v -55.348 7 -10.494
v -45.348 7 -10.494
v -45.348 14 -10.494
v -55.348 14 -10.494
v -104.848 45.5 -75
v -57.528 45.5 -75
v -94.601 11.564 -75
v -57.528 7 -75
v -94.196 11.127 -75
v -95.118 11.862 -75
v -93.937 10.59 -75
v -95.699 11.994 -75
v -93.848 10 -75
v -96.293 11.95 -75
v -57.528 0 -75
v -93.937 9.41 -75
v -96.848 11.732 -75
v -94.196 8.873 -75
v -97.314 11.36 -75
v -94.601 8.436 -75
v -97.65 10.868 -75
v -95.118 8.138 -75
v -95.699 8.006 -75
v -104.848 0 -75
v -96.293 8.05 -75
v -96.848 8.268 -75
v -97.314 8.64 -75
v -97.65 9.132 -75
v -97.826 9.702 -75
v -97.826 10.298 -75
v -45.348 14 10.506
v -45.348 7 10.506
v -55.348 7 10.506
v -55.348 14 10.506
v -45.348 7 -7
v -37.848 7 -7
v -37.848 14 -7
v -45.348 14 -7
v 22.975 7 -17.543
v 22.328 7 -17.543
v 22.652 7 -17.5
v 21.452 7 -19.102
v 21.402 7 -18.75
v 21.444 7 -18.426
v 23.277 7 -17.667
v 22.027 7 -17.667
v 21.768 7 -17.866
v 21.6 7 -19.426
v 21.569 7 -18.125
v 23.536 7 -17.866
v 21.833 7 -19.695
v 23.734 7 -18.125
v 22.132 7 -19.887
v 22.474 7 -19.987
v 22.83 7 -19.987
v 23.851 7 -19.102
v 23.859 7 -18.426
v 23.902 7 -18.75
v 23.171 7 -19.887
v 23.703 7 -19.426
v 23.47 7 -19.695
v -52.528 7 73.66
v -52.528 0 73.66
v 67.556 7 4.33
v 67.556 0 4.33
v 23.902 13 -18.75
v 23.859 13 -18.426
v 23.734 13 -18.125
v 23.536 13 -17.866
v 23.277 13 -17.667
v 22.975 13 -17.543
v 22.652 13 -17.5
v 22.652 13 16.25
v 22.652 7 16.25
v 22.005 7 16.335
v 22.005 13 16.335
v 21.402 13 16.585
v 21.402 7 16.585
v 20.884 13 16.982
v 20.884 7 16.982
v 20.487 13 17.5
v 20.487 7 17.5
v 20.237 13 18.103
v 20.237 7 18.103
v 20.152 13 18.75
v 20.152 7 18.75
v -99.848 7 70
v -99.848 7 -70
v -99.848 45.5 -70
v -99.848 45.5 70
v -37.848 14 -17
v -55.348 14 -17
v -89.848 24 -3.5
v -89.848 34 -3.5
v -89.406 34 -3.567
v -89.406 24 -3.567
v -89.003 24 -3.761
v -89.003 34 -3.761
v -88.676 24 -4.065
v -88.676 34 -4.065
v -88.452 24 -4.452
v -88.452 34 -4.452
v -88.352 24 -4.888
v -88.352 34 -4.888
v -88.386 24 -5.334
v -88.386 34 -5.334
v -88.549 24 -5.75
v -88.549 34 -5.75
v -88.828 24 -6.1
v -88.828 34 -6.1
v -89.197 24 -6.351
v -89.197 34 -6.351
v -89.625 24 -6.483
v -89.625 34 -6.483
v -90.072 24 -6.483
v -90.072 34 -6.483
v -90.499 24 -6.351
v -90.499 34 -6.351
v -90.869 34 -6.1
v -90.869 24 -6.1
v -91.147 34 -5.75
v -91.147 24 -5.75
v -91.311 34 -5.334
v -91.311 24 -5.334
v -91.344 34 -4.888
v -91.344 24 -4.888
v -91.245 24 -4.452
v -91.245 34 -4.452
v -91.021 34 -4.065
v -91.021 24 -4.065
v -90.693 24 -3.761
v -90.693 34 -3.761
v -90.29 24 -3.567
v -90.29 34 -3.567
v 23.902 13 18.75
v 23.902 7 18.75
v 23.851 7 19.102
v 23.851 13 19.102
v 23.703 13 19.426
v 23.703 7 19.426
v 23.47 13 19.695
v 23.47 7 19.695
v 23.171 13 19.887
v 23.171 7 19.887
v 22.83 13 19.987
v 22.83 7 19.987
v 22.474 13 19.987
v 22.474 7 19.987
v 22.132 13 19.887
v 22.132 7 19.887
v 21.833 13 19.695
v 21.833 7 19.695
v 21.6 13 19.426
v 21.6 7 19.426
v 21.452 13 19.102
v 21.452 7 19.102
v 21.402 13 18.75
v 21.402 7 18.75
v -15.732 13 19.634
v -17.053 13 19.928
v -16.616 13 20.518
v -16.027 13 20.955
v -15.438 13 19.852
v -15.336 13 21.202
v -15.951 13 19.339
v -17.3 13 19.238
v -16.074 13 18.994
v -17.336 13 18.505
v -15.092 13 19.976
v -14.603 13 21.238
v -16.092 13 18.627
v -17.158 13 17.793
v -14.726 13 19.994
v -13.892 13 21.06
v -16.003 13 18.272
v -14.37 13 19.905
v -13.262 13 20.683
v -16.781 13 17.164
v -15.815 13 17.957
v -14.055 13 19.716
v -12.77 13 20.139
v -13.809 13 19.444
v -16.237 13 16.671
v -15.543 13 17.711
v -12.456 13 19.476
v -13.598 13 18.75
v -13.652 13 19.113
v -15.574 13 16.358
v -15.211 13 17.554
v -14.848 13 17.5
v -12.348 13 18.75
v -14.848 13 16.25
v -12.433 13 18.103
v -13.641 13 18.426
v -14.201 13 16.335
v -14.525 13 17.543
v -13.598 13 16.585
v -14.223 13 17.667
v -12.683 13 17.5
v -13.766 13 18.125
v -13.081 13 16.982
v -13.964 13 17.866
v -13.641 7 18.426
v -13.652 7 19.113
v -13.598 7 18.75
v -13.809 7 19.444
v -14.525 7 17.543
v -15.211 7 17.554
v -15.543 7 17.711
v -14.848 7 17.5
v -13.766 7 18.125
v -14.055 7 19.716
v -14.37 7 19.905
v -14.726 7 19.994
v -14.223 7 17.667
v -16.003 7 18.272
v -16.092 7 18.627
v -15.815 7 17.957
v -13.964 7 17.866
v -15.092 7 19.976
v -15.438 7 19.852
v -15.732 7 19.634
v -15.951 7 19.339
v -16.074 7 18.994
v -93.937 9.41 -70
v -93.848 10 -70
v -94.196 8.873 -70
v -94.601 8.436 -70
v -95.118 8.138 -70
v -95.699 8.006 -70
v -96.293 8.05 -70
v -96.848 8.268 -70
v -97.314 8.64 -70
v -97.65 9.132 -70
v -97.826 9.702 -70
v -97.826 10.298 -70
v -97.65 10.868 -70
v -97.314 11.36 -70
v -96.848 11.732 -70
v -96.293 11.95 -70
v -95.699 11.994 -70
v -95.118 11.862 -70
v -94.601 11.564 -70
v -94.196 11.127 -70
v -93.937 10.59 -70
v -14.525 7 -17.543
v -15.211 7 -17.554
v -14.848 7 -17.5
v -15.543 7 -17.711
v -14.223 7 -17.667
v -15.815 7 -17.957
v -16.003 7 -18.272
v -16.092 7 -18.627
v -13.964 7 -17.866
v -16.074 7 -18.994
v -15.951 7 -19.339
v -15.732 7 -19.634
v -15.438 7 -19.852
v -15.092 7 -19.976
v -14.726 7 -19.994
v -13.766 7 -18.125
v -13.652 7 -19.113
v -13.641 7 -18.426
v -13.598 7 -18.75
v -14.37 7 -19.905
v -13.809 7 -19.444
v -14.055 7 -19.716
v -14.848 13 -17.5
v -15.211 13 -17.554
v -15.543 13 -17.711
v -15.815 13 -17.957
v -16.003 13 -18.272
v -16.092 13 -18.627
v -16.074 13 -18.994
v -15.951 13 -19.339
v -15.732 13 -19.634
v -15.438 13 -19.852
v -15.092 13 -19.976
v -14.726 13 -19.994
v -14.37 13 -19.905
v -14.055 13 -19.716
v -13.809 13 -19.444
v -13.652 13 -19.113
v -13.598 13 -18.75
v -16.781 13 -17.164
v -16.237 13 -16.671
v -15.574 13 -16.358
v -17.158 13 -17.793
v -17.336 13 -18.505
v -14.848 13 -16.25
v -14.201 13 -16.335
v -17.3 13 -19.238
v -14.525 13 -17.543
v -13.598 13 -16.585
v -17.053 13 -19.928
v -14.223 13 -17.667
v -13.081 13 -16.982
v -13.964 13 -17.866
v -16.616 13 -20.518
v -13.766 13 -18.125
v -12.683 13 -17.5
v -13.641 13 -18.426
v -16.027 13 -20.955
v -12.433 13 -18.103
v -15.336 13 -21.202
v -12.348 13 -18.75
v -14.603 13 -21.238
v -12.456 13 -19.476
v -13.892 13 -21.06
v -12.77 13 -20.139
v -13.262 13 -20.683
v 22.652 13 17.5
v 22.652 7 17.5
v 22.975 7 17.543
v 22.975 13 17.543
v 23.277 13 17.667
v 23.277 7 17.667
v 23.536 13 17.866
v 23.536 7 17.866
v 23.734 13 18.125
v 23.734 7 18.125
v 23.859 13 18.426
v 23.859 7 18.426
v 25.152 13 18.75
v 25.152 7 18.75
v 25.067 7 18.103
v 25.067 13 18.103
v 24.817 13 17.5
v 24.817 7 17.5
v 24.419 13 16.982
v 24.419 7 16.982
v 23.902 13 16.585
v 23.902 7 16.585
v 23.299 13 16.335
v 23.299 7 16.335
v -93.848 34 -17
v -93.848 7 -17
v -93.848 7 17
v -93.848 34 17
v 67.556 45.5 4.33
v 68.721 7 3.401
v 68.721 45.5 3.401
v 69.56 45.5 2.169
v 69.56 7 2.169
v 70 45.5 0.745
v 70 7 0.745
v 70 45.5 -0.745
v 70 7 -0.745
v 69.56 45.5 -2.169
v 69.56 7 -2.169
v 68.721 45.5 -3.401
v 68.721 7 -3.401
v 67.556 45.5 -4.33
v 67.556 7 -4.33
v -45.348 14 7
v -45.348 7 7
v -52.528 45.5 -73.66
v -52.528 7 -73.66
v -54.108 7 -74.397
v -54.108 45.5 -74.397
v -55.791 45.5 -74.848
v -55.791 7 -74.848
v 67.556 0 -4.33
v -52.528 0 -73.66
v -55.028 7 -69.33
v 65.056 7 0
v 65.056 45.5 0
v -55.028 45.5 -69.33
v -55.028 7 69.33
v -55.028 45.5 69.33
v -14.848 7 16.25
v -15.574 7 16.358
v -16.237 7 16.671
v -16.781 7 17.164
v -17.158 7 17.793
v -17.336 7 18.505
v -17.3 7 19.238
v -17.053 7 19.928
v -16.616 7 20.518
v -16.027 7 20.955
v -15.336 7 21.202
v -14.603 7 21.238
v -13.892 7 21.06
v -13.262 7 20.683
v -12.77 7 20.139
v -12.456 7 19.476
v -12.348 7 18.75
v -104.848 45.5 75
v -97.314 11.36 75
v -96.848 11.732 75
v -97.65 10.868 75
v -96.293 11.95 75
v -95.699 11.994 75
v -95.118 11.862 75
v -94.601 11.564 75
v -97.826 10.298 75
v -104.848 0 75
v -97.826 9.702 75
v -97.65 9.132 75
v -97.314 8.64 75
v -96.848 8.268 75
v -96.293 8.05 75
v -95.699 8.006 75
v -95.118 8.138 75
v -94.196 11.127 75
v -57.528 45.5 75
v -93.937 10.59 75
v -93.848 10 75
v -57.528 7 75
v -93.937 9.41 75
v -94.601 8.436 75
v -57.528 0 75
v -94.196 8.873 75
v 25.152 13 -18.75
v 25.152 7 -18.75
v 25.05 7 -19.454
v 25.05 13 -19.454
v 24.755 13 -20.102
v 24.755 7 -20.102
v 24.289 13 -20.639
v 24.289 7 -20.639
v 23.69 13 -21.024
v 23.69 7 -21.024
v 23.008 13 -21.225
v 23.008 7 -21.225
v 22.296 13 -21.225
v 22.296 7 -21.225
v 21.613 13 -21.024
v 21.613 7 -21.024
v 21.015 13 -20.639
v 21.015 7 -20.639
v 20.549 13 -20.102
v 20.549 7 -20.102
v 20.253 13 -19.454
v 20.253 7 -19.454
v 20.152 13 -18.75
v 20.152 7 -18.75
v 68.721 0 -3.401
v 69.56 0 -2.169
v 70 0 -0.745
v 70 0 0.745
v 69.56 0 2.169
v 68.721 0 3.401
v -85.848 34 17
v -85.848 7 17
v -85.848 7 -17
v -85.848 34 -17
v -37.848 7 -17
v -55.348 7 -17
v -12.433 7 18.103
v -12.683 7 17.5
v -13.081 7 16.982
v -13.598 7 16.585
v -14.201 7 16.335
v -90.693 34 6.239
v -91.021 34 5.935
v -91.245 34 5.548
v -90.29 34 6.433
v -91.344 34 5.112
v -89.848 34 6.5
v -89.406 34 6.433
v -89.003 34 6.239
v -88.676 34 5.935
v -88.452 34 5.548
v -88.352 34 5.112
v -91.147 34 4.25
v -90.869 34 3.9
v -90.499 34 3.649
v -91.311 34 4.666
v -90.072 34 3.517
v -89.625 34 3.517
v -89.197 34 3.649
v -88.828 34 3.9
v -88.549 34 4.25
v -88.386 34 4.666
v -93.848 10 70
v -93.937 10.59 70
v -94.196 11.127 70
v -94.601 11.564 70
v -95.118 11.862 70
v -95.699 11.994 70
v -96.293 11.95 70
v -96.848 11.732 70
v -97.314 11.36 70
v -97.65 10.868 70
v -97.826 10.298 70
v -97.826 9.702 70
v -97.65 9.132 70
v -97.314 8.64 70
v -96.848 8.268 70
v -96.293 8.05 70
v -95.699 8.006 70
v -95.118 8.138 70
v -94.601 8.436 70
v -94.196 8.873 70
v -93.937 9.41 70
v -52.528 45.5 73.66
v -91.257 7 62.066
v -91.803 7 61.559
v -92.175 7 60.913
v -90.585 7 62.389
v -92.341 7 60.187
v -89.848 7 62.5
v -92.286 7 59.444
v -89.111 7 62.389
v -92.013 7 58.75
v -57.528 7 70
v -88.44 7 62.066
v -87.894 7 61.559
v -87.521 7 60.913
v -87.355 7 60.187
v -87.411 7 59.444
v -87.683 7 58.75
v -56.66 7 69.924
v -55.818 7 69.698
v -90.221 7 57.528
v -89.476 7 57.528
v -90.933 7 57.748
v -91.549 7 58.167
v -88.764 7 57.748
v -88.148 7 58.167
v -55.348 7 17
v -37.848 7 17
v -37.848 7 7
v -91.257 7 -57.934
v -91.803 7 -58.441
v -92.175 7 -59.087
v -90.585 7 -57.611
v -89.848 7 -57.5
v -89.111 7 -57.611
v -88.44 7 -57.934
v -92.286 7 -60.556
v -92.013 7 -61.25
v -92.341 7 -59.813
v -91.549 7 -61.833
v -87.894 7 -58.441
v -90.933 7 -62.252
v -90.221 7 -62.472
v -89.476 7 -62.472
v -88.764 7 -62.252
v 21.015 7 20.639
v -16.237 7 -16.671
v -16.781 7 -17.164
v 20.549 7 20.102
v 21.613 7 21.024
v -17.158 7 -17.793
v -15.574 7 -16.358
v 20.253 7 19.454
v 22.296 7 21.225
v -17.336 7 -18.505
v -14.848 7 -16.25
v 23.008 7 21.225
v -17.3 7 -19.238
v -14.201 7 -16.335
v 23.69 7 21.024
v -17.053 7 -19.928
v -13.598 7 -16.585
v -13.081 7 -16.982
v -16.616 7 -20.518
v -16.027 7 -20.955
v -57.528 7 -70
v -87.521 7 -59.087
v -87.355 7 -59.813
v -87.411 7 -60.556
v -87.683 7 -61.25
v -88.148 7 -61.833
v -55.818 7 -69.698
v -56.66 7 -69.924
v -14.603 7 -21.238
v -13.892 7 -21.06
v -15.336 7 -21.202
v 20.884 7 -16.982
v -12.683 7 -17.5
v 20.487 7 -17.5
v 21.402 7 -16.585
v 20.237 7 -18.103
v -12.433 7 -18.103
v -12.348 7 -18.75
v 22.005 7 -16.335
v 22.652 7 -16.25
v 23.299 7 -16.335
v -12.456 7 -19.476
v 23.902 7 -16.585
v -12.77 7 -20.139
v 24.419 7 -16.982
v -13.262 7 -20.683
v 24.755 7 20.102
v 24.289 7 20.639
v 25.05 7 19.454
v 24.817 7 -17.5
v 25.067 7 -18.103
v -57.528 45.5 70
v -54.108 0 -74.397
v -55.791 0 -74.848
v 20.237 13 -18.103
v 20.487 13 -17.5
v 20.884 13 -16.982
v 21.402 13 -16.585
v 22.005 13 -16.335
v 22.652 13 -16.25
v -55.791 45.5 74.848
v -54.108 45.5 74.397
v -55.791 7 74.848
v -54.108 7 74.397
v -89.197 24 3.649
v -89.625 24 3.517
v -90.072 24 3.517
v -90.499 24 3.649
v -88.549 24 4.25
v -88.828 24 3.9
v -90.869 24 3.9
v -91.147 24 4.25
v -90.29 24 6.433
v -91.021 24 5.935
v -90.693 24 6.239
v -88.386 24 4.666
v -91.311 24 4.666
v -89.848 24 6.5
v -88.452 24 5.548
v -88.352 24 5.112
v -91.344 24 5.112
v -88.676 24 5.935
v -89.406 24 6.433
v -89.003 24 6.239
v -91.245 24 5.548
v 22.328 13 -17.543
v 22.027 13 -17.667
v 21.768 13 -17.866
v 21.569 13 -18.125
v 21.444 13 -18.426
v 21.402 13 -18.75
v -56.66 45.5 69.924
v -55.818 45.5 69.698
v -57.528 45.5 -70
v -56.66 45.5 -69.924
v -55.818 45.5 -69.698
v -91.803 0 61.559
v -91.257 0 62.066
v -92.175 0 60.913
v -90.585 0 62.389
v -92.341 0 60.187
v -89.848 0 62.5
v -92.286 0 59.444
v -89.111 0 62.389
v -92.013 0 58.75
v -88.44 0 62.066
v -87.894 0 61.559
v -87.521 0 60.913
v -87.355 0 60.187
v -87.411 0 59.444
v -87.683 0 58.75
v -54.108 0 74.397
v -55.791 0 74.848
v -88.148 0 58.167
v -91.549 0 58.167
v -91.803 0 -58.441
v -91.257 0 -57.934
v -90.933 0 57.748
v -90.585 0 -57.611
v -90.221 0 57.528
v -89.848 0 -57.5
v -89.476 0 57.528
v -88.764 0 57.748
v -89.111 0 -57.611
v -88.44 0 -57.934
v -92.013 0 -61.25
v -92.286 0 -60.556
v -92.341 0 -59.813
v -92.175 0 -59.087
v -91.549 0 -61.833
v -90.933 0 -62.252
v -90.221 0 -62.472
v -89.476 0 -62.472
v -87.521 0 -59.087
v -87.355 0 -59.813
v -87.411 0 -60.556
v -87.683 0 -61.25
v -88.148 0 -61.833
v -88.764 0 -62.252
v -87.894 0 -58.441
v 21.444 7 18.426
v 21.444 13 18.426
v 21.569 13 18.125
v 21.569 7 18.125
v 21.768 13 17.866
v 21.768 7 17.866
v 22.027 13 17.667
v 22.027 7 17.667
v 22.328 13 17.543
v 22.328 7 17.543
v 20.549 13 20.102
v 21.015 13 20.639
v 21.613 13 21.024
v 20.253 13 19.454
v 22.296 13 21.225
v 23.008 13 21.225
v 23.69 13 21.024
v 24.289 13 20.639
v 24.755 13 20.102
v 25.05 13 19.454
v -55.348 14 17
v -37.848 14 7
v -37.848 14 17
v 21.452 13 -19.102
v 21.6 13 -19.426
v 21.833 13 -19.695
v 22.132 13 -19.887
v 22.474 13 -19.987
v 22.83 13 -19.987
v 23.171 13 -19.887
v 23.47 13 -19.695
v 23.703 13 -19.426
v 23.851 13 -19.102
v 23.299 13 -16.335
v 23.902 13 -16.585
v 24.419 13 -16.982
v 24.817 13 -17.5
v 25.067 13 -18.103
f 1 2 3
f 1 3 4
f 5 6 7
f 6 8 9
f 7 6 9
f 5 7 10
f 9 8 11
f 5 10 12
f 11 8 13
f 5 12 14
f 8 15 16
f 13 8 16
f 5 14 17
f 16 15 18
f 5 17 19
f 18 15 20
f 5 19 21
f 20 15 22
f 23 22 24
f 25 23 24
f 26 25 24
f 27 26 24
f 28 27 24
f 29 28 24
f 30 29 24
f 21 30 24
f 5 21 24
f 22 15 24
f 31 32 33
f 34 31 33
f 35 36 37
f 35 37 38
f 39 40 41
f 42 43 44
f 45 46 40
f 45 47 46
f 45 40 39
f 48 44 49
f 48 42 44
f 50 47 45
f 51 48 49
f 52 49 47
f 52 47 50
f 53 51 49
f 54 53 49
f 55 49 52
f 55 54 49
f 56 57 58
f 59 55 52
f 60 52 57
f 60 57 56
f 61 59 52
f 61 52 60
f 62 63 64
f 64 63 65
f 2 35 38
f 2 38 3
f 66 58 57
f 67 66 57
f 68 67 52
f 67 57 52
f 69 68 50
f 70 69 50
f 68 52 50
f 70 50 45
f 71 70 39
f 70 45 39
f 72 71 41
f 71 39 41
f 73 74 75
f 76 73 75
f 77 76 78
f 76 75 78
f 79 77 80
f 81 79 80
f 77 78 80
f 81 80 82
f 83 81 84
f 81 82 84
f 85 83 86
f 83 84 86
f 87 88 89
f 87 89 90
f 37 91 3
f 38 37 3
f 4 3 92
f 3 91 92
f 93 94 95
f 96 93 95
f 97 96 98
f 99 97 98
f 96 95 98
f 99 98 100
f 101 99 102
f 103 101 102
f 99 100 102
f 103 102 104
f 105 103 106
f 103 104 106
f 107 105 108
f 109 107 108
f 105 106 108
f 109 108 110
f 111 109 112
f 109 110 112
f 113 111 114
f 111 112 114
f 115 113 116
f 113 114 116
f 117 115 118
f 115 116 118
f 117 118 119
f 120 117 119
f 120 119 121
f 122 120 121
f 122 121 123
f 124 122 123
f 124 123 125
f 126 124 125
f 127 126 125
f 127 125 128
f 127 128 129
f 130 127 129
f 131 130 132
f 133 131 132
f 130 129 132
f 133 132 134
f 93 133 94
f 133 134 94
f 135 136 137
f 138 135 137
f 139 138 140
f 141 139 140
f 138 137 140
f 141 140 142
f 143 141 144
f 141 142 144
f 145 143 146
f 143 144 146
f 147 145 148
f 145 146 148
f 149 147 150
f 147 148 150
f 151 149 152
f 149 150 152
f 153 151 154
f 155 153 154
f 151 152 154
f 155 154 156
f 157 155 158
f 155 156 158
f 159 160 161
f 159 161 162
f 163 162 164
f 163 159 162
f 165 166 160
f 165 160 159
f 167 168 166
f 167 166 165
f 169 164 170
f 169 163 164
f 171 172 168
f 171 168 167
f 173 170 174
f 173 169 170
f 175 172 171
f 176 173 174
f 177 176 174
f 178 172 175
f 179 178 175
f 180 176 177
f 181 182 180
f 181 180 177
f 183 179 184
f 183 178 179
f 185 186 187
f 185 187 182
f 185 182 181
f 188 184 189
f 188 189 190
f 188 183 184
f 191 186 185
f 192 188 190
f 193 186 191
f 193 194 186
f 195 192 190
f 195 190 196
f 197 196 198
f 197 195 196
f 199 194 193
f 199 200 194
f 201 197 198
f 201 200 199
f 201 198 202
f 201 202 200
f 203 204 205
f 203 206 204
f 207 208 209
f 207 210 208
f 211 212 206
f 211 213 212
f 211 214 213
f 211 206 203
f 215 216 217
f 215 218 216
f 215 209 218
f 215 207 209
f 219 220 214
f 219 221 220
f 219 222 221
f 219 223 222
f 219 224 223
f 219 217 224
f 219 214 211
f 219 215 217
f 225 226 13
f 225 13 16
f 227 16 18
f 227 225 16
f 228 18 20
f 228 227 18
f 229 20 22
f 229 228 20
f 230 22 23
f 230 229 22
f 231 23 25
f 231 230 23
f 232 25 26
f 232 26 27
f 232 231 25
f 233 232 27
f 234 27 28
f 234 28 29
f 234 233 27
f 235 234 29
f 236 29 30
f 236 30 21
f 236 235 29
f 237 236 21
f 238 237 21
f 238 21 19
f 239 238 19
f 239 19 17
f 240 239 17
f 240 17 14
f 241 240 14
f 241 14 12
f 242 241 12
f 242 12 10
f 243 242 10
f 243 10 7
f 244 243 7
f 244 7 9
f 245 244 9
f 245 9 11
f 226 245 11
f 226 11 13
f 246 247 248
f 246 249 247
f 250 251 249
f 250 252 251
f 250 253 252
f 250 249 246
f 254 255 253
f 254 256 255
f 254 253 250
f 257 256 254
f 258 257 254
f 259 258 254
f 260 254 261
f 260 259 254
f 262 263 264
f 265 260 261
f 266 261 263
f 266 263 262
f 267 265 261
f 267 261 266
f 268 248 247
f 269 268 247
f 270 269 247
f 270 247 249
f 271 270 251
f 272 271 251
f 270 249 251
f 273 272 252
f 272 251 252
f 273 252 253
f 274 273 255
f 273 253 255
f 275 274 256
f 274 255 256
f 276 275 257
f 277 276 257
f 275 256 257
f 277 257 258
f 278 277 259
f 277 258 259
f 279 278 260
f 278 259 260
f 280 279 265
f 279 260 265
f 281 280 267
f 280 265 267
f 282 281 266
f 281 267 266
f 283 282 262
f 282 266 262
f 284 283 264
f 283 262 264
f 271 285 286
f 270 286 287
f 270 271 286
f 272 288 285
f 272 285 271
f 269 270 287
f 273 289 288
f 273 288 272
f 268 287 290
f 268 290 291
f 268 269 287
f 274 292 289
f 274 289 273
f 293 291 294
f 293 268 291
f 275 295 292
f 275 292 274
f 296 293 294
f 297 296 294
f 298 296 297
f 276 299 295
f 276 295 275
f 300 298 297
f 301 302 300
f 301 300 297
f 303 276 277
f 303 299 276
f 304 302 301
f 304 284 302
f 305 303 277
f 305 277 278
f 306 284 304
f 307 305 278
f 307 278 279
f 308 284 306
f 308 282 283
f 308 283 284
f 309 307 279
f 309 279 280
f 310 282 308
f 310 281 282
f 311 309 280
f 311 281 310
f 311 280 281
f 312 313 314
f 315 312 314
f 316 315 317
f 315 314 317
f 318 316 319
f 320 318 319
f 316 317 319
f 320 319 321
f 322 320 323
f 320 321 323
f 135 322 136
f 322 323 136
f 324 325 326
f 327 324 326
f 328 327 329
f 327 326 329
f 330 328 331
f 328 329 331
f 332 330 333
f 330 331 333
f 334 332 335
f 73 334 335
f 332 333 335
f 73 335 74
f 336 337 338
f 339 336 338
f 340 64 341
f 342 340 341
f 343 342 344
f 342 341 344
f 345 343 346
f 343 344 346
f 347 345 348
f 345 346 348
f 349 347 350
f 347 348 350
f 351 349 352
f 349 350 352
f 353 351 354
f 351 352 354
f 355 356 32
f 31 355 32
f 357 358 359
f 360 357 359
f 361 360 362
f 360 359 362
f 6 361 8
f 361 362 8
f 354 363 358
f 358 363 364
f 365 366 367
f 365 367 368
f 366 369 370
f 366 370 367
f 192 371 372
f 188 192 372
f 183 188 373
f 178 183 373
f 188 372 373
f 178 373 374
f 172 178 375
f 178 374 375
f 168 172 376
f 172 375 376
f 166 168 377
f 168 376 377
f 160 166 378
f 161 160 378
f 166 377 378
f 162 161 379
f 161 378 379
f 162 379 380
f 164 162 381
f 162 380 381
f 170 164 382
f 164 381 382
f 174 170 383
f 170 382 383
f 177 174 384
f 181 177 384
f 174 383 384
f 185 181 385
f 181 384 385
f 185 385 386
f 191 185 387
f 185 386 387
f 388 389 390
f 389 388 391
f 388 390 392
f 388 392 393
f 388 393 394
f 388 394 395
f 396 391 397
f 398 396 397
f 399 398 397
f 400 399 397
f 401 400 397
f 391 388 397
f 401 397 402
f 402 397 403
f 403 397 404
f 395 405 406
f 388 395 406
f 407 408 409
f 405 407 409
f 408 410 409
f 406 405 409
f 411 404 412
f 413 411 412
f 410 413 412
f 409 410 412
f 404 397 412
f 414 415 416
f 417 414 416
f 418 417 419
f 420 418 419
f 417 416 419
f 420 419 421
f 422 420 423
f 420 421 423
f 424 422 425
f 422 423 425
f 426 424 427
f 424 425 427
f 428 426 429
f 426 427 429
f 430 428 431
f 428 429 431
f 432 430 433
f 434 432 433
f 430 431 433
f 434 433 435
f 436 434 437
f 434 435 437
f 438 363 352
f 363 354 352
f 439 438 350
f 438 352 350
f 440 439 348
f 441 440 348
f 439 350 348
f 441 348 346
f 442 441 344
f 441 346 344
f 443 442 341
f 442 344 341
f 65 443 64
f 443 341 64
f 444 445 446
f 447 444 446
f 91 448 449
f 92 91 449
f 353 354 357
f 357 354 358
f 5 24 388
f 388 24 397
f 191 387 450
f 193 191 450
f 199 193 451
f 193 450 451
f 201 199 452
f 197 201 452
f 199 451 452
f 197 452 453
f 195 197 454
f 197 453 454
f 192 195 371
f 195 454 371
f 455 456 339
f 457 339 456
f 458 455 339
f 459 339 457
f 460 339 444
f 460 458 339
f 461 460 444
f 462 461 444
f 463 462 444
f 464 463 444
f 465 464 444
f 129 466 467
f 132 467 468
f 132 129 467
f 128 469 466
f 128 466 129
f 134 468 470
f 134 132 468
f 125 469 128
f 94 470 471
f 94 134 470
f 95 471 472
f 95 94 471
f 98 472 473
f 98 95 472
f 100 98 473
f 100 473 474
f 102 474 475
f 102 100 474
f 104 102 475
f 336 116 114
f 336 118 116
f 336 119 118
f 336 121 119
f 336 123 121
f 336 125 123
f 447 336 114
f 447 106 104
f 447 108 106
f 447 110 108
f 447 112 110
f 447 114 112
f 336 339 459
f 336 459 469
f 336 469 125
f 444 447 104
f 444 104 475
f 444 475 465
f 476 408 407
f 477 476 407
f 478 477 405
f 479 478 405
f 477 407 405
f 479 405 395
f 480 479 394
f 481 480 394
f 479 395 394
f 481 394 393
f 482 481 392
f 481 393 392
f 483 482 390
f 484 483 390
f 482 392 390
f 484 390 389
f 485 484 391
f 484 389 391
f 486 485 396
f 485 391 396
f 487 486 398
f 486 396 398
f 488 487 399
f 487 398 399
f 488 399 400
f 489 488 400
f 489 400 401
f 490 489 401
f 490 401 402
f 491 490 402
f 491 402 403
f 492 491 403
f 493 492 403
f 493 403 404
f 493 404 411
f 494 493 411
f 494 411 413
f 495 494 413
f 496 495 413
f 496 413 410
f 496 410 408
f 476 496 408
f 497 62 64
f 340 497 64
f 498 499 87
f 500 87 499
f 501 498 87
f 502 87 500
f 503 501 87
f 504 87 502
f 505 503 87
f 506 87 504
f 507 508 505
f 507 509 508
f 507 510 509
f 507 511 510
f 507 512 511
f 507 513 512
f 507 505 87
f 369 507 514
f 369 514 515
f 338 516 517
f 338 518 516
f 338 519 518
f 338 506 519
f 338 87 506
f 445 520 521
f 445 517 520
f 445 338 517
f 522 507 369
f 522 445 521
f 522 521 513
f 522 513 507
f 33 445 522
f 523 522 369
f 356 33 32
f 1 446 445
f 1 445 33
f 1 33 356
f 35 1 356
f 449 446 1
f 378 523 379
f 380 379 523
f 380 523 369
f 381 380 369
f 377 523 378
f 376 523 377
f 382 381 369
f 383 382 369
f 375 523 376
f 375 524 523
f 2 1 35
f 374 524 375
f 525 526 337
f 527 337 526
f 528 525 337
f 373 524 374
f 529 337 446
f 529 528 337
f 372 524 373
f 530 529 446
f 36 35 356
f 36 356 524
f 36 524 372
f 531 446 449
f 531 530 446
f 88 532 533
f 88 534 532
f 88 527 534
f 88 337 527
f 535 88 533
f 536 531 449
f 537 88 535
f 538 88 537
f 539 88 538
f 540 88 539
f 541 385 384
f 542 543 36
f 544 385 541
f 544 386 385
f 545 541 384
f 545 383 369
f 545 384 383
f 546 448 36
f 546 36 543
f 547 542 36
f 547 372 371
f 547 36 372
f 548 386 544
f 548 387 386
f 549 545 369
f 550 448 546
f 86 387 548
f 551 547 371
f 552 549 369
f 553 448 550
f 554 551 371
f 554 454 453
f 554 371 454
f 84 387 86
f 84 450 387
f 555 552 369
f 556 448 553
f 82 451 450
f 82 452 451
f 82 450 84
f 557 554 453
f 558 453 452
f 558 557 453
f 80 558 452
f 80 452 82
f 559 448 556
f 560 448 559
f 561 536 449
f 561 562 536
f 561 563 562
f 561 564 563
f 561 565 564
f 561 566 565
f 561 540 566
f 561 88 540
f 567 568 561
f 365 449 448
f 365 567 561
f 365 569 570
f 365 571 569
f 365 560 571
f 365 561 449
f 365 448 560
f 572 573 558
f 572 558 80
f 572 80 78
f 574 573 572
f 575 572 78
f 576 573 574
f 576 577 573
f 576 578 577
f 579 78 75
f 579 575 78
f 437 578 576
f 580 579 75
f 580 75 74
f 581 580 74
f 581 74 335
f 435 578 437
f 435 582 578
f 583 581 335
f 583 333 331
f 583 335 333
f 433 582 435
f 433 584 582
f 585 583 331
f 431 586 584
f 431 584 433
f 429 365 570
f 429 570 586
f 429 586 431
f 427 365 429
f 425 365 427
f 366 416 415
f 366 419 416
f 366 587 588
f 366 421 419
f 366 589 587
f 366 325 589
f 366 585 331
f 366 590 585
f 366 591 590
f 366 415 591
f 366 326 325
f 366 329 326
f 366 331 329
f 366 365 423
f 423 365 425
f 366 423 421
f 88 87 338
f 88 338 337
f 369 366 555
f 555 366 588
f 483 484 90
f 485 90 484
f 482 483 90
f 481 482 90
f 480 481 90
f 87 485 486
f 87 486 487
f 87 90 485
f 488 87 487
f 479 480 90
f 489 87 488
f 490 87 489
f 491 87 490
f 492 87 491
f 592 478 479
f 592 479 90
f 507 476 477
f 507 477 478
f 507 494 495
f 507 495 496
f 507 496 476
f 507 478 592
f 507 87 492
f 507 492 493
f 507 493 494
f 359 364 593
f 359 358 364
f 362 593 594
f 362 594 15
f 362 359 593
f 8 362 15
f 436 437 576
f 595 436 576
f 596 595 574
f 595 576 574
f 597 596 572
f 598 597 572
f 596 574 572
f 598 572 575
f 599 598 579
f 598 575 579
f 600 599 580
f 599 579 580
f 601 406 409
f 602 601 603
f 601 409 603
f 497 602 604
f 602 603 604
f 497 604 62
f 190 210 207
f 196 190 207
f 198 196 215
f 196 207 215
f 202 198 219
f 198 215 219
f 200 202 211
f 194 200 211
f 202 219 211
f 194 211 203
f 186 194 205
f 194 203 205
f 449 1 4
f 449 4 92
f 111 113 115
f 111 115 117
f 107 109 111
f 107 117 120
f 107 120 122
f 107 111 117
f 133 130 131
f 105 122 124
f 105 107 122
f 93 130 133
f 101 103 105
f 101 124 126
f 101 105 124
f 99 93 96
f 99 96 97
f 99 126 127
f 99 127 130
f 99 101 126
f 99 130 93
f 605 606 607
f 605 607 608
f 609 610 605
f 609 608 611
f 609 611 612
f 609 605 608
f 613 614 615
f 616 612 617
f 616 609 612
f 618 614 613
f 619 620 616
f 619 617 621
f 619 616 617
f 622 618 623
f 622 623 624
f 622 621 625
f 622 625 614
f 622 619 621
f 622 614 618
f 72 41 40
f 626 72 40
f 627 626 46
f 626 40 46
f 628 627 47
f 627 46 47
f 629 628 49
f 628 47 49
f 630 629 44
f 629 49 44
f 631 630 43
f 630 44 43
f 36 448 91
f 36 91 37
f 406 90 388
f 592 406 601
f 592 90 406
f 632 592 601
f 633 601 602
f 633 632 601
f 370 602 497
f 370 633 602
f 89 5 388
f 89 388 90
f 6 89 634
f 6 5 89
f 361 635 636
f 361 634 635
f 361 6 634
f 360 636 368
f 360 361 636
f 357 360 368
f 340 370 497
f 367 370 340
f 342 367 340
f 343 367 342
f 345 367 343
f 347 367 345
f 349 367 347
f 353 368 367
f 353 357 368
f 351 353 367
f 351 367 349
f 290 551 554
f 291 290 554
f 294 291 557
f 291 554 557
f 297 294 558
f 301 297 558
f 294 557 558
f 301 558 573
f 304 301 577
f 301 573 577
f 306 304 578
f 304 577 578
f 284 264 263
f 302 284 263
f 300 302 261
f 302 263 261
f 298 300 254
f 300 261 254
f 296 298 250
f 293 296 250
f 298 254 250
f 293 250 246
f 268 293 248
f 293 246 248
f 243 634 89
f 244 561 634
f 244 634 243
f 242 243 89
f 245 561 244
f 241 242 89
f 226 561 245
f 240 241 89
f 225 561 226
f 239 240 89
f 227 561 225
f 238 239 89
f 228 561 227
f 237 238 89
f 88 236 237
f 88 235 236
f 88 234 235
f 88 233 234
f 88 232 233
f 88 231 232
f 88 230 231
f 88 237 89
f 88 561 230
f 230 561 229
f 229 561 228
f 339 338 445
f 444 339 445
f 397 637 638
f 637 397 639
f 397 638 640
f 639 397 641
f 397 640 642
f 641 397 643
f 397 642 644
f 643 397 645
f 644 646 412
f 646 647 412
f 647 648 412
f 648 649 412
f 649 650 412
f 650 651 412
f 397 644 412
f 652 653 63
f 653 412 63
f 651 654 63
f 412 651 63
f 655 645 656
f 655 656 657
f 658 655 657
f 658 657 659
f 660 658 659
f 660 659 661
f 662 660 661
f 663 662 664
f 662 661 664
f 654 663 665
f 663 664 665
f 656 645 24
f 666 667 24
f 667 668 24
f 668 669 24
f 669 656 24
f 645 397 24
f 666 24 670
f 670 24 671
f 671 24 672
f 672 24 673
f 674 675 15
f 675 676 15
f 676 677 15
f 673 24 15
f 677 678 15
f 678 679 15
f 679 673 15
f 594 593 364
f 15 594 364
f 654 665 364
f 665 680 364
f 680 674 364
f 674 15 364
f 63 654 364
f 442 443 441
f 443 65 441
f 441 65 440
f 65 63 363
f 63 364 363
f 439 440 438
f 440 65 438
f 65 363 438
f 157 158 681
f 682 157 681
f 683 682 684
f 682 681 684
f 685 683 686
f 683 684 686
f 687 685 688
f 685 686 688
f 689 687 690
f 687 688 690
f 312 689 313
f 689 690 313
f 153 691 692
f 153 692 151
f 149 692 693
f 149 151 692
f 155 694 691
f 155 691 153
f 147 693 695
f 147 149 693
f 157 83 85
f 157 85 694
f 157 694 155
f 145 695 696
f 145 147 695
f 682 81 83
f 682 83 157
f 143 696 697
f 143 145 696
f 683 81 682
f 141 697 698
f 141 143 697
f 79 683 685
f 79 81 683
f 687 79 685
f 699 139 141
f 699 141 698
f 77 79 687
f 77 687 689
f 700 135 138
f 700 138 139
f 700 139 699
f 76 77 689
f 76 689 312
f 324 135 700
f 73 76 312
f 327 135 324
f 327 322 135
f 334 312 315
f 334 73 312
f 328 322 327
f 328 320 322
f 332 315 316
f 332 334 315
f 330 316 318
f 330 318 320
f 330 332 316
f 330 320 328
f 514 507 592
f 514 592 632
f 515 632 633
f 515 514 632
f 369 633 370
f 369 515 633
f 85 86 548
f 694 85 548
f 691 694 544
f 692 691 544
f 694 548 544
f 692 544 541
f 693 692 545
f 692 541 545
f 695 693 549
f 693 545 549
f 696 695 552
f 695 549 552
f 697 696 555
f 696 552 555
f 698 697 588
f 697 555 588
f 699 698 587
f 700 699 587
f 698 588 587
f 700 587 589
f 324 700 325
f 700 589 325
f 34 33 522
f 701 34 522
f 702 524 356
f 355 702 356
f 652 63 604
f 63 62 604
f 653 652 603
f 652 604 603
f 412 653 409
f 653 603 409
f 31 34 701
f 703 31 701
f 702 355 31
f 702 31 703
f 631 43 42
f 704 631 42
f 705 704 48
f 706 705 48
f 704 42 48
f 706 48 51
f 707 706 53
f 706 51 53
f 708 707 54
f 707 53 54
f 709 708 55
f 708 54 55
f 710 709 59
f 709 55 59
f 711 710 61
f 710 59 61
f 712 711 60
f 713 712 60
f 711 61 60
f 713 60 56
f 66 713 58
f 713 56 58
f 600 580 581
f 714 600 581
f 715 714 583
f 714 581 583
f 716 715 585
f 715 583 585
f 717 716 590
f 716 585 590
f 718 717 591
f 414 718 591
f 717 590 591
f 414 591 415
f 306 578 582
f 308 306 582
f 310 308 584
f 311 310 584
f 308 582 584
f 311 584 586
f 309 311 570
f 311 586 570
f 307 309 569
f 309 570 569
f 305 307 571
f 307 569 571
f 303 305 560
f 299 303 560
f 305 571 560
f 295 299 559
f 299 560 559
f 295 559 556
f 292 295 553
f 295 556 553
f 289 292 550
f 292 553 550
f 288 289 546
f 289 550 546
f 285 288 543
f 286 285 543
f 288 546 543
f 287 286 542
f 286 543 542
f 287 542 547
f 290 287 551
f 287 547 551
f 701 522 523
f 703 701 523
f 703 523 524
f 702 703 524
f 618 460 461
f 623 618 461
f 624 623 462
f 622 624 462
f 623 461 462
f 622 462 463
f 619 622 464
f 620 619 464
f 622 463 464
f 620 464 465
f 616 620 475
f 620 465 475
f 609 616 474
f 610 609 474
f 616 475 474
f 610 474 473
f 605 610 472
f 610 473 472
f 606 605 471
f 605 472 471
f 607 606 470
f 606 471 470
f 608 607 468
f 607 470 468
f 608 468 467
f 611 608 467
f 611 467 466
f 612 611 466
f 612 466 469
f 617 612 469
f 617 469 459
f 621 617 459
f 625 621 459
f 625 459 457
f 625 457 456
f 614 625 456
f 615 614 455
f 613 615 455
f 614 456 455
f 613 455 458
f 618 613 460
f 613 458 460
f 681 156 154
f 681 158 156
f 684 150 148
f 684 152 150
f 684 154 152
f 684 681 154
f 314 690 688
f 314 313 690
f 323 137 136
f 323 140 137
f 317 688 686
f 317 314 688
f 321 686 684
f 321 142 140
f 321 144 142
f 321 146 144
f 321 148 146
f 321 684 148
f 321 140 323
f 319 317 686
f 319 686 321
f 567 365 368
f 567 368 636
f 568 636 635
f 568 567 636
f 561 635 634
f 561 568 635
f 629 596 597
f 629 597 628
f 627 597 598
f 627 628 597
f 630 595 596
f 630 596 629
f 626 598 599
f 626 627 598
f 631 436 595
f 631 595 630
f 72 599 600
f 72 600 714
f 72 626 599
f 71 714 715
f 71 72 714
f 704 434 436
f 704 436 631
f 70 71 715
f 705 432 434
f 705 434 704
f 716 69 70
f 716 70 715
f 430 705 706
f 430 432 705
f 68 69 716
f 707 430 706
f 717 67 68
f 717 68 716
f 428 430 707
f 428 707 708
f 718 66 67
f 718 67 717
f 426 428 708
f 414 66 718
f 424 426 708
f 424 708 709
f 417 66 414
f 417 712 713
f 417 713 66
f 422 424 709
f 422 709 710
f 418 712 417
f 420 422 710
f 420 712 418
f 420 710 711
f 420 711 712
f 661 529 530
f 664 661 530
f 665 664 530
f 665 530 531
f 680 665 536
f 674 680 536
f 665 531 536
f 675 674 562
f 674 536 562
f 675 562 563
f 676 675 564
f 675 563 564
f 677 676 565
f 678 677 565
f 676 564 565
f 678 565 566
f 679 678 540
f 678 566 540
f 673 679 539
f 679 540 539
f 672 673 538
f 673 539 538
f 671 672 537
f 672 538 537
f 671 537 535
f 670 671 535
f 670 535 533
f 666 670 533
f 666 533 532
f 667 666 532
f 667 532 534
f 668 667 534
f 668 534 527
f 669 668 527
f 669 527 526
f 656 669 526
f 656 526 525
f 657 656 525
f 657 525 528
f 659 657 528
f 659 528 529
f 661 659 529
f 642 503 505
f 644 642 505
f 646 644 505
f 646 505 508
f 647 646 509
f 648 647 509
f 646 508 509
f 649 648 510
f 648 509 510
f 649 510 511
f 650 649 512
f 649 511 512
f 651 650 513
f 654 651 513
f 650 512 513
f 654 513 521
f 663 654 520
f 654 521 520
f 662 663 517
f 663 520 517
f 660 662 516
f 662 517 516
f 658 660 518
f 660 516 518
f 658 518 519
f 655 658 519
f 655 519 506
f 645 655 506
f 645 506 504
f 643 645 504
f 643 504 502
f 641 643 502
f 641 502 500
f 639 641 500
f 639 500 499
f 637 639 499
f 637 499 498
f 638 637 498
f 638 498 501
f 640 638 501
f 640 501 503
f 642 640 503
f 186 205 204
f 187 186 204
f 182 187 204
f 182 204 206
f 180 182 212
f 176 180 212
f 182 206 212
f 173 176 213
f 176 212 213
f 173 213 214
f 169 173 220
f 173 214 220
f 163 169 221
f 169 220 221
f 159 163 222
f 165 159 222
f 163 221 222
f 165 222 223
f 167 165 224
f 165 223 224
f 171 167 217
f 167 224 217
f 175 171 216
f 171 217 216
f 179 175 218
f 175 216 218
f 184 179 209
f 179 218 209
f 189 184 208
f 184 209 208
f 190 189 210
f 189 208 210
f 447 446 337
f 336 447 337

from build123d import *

# Parameters (mm, degrees)
BOSS_EXTRUDE1_DEPTH = 7
FILLET1_R           = 5
FILLET2_R           = 10
CUT_EXTRUDE1_REACH  = 131.101
SKETCH3_R           = 2.5
BOSS_EXTRUDE2_DEPTH = 6
SKETCH7_W           = 4
SKETCH7_H           = 10
BOSS_EXTRUDE3_DEPTH = 27
SKETCH8_R           = 1.5
CUT_EXTRUDE2_DEPTH  = 10
BOSS_EXTRUDE4_DEPTH = 7
BOSS_EXTRUDE5_DEPTH = 7
BOSS_EXTRUDE6_DEPTH = 38.5
SKETCH14_R          = 2
CUT_EXTRUDE3_DEPTH  = 10
CUT_EXTRUDE4_START  = -10
SKETCH15_R          = 2
CUT_EXTRUDE4_DEPTH  = 10


with BuildPart() as part:
    # Sketch1 → Boss-Extrude1 (new body)
    with BuildSketch(Plane(origin=(0, 0, 0), x_dir=(1, 0, 0), z_dir=(0, 1, 0))):
        Polygon((75.055534995, 0), (-54.848275573, 75), (-104.848275573, 75), (-104.848275573, -75), (-54.848275573, -75), align=None)
    extrude(amount=BOSS_EXTRUDE1_DEPTH)

    # Fillet1
    fillet1_edges = [part.edges().sort_by_distance(p)[0] for p in [
        (75.055534995, 3.5, 0),
    ]]
    fillet(fillet1_edges, radius=FILLET1_R)

    # Fillet2
    fillet2_edges = [part.edges().sort_by_distance(p)[0] for p in [
        (-54.848275573, 3.5, 75),
        (-54.848275573, 3.5, -75),
    ]]
    fillet(fillet2_edges, radius=FILLET2_R)

    # Sketch3 → Cut-Extrude1 (cut, up to next)
    with BuildSketch(Plane(origin=(0, 7, 0), x_dir=(1, 0, 0), z_dir=(0, 1, 0)), mode=Mode.PRIVATE) as cut_extrude1_sk1:
        with Locations(Location((-89.848275573, 60, 0), (0, 0, 270))):
            Circle(SKETCH3_R)
    cut_extrude1_tool1 = extrude(cut_extrude1_sk1.sketch, amount=-CUT_EXTRUDE1_REACH, mode=Mode.PRIVATE) & part.part
    # Sketch3 → Cut-Extrude1 (cut, up to next)
    with BuildSketch(Plane(origin=(0, 7, 0), x_dir=(1, 0, 0), z_dir=(0, 1, 0)), mode=Mode.PRIVATE) as cut_extrude1_sk2:
        with Locations(Location((-89.848275573, -60, 0), (0, 0, 270))):
            Circle(SKETCH3_R)
    cut_extrude1_tool2 = extrude(cut_extrude1_sk2.sketch, amount=-CUT_EXTRUDE1_REACH, mode=Mode.PRIVATE) & part.part
    add(cut_extrude1_tool1.solids().sort_by_distance((-89.848276, 7, -60))[0], mode=Mode.SUBTRACT)
    add(cut_extrude1_tool2.solids().sort_by_distance((-89.848276, 7, 60))[0], mode=Mode.SUBTRACT)

    # Sketch6 → Boss-Extrude2 (add)
    with BuildSketch(Plane(origin=(0, 7, 0), x_dir=(1, 0, 0), z_dir=(0, 1, 0))):
        with BuildLine():
            ThreePointArc((-14.848275573, 17.5), (-15.732159049, 19.633883476), (-13.598275573, 18.75))
            Line((-13.598275573, 18.75), (-12.348275573, 18.75))
            ThreePointArc((-12.348275573, 18.75), (-16.616042526, 20.517766953), (-14.848275573, 16.25))
            Line((-14.848275573, 16.25), (-14.848275573, 17.5))
        make_face()
        with BuildLine():
            Line((-12.348275573, 18.75), (-13.598275573, 18.75))
            ThreePointArc((-13.598275573, 18.75), (-13.964392097, 17.866116524), (-14.848275573, 17.5))
            Line((-14.848275573, 17.5), (-14.848275573, 16.25))
            ThreePointArc((-14.848275573, 16.25), (-13.08050862, 16.982233047), (-12.348275573, 18.75))
        make_face()
        with BuildLine():
            ThreePointArc((23.901724427, 18.75), (23.535607903, 17.866116524), (22.651724427, 17.5))
            Line((22.651724427, 17.5), (22.651724427, 16.25))
            ThreePointArc((22.651724427, 16.25), (24.41949138, 16.982233047), (25.151724427, 18.75))
            ThreePointArc((25.151724427, 18.75), (22.651724427, 21.25), (20.151724427, 18.75))
            Line((20.151724427, 18.75), (21.401724427, 18.75))
            ThreePointArc((21.401724427, 18.75), (22.651724427, 20), (23.901724427, 18.75))
        make_face()
        with BuildLine():
            Line((22.651724427, 16.25), (22.651724427, 17.5))
            ThreePointArc((22.651724427, 17.5), (21.767840951, 17.866116524), (21.401724427, 18.75))
            Line((21.401724427, 18.75), (20.151724427, 18.75))
            ThreePointArc((20.151724427, 18.75), (20.883957474, 16.982233047), (22.651724427, 16.25))
        make_face()
        with BuildLine():
            ThreePointArc((22.651724427, -16.25), (20.883957474, -16.982233047), (20.151724427, -18.75))
            Line((20.151724427, -18.75), (21.401724427, -18.75))
            ThreePointArc((21.401724427, -18.75), (21.767840951, -17.866116524), (22.651724427, -17.5))
            Line((22.651724427, -17.5), (22.651724427, -16.25))
        make_face()
        with BuildLine():
            Line((21.401724427, -18.75), (20.151724427, -18.75))
            ThreePointArc((20.151724427, -18.75), (22.651724427, -21.25), (25.151724427, -18.75))
            ThreePointArc((25.151724427, -18.75), (24.41949138, -16.982233047), (22.651724427, -16.25))
            Line((22.651724427, -16.25), (22.651724427, -17.5))
            ThreePointArc((22.651724427, -17.5), (23.535607903, -17.866116524), (23.901724427, -18.75))
            ThreePointArc((23.901724427, -18.75), (22.651724427, -20), (21.401724427, -18.75))
        make_face()
        with BuildLine():
            ThreePointArc((-14.848275573, -17.5), (-13.964392097, -17.866116524), (-13.598275573, -18.75))
            Line((-13.598275573, -18.75), (-12.348275573, -18.75))
            ThreePointArc((-12.348275573, -18.75), (-13.08050862, -16.982233047), (-14.848275573, -16.25))
            Line((-14.848275573, -16.25), (-14.848275573, -17.5))
        make_face()
        with BuildLine():
            Line((-12.348275573, -18.75), (-13.598275573, -18.75))
            ThreePointArc((-13.598275573, -18.75), (-15.732159049, -19.633883476), (-14.848275573, -17.5))
            Line((-14.848275573, -17.5), (-14.848275573, -16.25))
            ThreePointArc((-14.848275573, -16.25), (-16.616042526, -20.517766953), (-12.348275573, -18.75))
        make_face()
    extrude(amount=BOSS_EXTRUDE2_DEPTH)

    # Sketch7 → Boss-Extrude3 (add)
    with BuildSketch(Plane(origin=(0, 7, 0), x_dir=(1, 0, 0), z_dir=(0, 1, 0))):
        Polygon((-89.848275573, 5), (-85.848275573, 5), (-85.848275573, 17), (-93.848275573, 17), (-93.848275573, -17), (-85.848275573, -17), (-85.848275573, -5), (-89.848275573, -5), align=None)
        with Locations((-87.848275573, 0)):
            Rectangle(SKETCH7_W, SKETCH7_H)
    extrude(amount=BOSS_EXTRUDE3_DEPTH)

    # Sketch8 → Cut-Extrude2 (cut)
    with BuildSketch(Plane(origin=(0, 34, 0), x_dir=(1, 0, 0), z_dir=(0, 1, 0))):
        with Locations(Location((-89.848275573, -5, 0), (0, 0, 270))):
            Circle(SKETCH8_R)
        with Locations(Location((-89.848275573, 5, 0), (0, 0, 270))):
            Circle(SKETCH8_R)
    extrude(amount=-CUT_EXTRUDE2_DEPTH, mode=Mode.SUBTRACT)

    # Sketch7<4> → Boss-Extrude4 (add)
    with BuildSketch(Plane(origin=(0, 7, 0), x_dir=(1, 0, 0), z_dir=(0, 1, 0))):
        Polygon((-45.848275573, -17), (-37.848275573, -17), (-37.848275573, -7), (-45.348275573, -7), (-45.348275573, -10.506475343), (-55.348275573, -10.506475343), (-55.348275573, -17), align=None)
    extrude(amount=BOSS_EXTRUDE4_DEPTH)

    # Sketch7<5> → Boss-Extrude5 (add)
    with BuildSketch(Plane(origin=(0, 7, 0), x_dir=(1, 0, 0), z_dir=(0, 1, 0))):
        Polygon((-45.848275573, 17), (-37.848275573, 17), (-37.848275573, 7), (-45.348275573, 7), (-45.348275573, 10.493524657), (-55.348275573, 10.493524657), (-55.348275573, 17), align=None)
    extrude(amount=BOSS_EXTRUDE5_DEPTH)

    # Sketch11 → Boss-Extrude6 (add)
    with BuildSketch(Plane(origin=(0, 7, 0), x_dir=(1, 0, 0), z_dir=(0, 1, 0))):
        with BuildLine():
            Line((-104.848275573, 75), (-104.848275573, -75))
            Line((-104.848275573, -75), (-57.527767497, -75))
            ThreePointArc((-57.527767497, -75), (-54.939577046, -74.659258263), (-52.527767497, -73.660254038))
            Line((-52.527767497, -73.660254038), (67.555534995, -4.330127019))
            ThreePointArc((67.555534995, -4.330127019), (70.055534995, 0), (67.555534995, 4.330127019))
            Line((67.555534995, 4.330127019), (-52.527767497, 73.660254038))
            ThreePointArc((-52.527767497, 73.660254038), (-54.939577046, 74.659258263), (-57.527767497, 75))
            Line((-57.527767497, 75), (-104.848275573, 75))
        make_face()
        with BuildLine():
            ThreePointArc((-55.027767497, 69.330127019), (-56.233672272, 69.829629131), (-57.527767497, 70))
            Line((-57.527767497, 70), (-99.848275573, 70))
            Line((-99.848275573, 70), (-99.848275573, -70))
            Line((-99.848275573, -70), (-57.527767497, -70))
            ThreePointArc((-57.527767497, -70), (-56.233672272, -69.829629131), (-55.027767497, -69.330127019))
            Line((-55.027767497, -69.330127019), (65.055534995, 0))
            Line((65.055534995, 0), (-55.027767497, 69.330127019))
        make_face(mode=Mode.SUBTRACT)
    extrude(amount=BOSS_EXTRUDE6_DEPTH)

    # Sketch14 → Cut-Extrude3 (cut)
    with BuildSketch(Plane.XY.offset(75)):
        with Locations((-95.848275573, 10)):
            Circle(SKETCH14_R)
    extrude(amount=-CUT_EXTRUDE3_DEPTH, mode=Mode.SUBTRACT)

    # Sketch15 → Cut-Extrude4 (cut)
    with BuildSketch(Plane(origin=(0, 0, -75), x_dir=(-1, 0, 0), z_dir=(0, 0, -1)).offset(CUT_EXTRUDE4_START)):
        with Locations(Location((95.848275573, 10, 0), (0, 0, 180))):
            Circle(SKETCH15_R)
    extrude(amount=CUT_EXTRUDE4_DEPTH, mode=Mode.SUBTRACT)


solid = part.part
